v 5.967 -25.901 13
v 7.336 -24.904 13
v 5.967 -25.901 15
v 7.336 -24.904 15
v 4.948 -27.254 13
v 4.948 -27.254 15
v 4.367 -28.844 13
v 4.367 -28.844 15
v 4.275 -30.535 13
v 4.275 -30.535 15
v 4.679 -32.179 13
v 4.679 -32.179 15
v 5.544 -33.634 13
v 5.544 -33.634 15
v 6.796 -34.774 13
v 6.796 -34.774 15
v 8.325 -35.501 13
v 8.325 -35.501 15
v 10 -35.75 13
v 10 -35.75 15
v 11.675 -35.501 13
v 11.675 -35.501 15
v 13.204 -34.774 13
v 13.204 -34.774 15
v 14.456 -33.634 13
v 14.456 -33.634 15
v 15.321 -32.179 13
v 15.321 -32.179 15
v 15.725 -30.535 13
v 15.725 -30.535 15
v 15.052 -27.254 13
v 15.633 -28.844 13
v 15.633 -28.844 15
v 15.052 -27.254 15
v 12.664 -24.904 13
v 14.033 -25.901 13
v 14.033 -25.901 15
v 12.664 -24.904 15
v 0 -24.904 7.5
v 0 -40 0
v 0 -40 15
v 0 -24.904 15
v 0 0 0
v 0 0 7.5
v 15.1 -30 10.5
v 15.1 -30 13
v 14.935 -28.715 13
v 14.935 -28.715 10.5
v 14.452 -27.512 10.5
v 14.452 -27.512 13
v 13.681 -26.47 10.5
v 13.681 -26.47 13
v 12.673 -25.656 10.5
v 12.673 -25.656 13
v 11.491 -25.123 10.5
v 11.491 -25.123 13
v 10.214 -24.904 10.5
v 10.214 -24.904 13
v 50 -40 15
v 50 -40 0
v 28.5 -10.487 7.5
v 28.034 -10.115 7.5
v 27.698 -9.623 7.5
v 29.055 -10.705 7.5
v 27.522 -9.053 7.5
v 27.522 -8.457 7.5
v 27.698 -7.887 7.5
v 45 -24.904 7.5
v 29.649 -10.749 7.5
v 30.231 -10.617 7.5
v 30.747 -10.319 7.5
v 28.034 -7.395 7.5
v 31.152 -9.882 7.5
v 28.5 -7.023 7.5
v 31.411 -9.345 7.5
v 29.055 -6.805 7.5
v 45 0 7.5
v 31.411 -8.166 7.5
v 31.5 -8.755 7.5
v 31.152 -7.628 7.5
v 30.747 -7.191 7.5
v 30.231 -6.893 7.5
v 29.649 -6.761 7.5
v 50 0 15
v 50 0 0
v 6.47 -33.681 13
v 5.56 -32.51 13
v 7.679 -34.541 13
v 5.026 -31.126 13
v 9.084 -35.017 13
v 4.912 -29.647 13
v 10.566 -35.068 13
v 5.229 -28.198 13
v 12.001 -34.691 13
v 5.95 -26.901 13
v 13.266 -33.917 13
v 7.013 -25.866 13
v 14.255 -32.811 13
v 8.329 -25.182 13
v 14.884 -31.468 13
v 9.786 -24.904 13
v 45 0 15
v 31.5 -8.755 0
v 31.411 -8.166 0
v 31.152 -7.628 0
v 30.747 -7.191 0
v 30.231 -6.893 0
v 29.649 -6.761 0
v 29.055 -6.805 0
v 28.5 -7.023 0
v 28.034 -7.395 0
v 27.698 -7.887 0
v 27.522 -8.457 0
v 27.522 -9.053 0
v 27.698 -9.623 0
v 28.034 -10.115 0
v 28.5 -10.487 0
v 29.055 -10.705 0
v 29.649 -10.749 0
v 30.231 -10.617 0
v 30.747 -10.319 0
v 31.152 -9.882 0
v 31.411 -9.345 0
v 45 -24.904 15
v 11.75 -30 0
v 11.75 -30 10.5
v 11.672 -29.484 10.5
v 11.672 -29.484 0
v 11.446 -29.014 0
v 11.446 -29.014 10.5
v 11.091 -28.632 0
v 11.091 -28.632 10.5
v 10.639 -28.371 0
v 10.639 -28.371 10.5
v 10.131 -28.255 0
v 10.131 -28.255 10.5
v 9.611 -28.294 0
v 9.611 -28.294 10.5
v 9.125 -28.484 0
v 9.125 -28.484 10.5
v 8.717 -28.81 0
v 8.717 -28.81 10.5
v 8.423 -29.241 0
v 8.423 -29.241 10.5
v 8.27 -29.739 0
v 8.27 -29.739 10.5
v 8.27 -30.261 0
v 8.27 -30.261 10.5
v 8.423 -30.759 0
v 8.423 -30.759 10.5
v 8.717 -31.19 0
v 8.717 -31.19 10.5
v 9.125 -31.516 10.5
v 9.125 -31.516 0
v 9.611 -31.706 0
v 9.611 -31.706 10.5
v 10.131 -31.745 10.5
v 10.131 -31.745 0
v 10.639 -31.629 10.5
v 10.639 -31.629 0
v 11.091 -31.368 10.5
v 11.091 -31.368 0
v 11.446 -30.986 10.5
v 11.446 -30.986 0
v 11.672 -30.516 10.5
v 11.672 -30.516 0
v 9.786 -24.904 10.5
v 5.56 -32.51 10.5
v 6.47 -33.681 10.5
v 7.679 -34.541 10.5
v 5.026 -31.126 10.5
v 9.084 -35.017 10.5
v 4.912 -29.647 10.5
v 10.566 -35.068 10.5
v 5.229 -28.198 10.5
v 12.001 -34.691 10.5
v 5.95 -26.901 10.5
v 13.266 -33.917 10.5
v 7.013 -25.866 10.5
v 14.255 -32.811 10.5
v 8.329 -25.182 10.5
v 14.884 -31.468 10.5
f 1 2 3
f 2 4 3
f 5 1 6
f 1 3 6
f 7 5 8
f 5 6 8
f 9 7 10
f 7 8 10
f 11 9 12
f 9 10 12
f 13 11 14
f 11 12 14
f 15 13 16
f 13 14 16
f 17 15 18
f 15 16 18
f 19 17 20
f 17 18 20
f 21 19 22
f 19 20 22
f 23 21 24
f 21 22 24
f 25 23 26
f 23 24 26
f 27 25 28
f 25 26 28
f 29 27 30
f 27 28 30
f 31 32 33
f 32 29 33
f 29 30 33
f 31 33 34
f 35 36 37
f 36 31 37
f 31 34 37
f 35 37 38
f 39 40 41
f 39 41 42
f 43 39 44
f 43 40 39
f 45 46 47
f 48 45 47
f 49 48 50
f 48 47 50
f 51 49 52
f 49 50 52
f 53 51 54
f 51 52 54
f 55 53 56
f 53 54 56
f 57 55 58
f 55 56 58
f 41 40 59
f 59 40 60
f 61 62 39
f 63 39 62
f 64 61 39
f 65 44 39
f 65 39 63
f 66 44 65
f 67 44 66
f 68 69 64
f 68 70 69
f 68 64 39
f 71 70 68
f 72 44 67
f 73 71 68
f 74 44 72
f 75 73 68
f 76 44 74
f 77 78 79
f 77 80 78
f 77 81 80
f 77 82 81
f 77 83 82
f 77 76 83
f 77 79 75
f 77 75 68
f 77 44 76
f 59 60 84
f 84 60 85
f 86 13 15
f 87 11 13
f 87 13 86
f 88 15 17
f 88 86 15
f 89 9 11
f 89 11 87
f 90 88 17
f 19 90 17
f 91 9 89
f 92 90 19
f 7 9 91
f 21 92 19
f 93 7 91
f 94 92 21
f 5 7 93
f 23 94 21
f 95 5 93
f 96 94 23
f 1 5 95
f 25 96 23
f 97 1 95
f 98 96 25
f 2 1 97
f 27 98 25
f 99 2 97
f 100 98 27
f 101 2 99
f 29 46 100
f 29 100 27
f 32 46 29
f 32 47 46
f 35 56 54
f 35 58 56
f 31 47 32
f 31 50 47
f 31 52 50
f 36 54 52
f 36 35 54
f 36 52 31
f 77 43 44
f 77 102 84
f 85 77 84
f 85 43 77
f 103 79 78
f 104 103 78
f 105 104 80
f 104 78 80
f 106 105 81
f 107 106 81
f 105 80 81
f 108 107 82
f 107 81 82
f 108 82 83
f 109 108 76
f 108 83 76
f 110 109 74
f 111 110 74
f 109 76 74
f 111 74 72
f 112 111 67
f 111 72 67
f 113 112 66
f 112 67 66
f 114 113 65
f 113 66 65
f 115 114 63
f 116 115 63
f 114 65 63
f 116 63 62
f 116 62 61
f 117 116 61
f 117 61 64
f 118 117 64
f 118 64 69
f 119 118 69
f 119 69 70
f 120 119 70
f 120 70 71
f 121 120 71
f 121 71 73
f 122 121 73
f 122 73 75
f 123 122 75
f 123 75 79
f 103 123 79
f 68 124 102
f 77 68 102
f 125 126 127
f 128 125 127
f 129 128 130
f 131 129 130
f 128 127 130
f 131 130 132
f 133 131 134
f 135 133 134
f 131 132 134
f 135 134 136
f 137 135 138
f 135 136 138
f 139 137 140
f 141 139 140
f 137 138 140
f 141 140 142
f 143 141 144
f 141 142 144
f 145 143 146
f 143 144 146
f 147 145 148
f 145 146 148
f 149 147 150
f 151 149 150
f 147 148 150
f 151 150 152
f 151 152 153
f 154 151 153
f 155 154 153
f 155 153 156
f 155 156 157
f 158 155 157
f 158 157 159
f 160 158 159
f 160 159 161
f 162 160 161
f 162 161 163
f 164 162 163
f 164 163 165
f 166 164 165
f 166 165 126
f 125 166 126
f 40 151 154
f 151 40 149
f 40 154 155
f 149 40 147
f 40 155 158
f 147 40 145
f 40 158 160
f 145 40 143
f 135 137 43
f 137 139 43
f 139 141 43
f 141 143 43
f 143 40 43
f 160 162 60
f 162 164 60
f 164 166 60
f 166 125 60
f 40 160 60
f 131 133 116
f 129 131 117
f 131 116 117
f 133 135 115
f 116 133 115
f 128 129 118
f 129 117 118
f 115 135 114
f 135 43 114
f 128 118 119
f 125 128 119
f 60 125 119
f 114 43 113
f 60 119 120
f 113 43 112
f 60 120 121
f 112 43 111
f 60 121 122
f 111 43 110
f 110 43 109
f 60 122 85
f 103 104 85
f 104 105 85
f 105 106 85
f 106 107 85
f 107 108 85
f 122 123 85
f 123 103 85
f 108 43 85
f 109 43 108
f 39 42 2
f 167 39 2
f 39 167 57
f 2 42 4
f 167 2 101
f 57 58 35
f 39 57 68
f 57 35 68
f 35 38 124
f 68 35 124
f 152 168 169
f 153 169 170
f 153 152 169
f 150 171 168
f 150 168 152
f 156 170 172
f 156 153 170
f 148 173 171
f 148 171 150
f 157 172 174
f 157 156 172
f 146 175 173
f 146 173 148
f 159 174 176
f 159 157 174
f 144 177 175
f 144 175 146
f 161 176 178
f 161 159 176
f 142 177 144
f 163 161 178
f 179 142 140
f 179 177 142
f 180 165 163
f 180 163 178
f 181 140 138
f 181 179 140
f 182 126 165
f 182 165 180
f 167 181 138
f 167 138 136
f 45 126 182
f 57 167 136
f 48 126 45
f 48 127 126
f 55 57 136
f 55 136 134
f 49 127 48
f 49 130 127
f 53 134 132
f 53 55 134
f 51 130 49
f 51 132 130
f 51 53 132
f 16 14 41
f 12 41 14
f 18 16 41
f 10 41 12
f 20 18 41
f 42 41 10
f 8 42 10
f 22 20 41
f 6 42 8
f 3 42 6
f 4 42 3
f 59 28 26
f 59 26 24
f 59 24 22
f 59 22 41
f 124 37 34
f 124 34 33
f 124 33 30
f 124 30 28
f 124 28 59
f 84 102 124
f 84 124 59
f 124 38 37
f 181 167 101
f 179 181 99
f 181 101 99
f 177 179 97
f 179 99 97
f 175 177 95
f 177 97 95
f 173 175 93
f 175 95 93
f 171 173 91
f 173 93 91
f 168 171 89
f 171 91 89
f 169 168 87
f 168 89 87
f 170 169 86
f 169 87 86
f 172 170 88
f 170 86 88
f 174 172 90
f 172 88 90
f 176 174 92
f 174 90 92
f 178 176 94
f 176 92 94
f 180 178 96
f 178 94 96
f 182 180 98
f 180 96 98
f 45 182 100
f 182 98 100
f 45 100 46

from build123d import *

# Parameters (mm, degrees)
F0_W      = 50
F0_H      = 40
F1_DEPTH  = 15
F2_R      = 5.75
F3_DEPTH  = 2
F4_R      = 2
F5_DEPTH  = 15.001
F6_W      = 45
F6_H      = 24.904493
F7_DEPTH  = 7.5
F8_R      = 5.1
F9_DEPTH  = 2.5
F10_R     = 1.75
F11_DEPTH = 15.001


with BuildPart() as f1:
    # F0 (on Top) → F1 (new body)
    with BuildSketch(Plane.XY):
        with Locations((25, -20)):
            Rectangle(F0_W, F0_H)
    extrude(amount=F1_DEPTH)

    # F2 (on face) → F3 (cut)
    with BuildSketch(Plane.XY.offset(15)):
        with Locations((10, -30)):
            Circle(F2_R)
    extrude(amount=-F3_DEPTH, mode=Mode.SUBTRACT)

    # F4 (on face) → F5 (cut, through all)
    with BuildSketch(Plane.XY.offset(15)):
        with Locations((29.5, -8.755066)):
            Circle(F4_R)
    extrude(amount=-F5_DEPTH, mode=Mode.SUBTRACT)

    # F6 (on face) → F7 (cut)
    with BuildSketch(Plane.XY.offset(15)):
        with Locations((22.5, -12.452246)):
            Rectangle(F6_W, F6_H)
    extrude(amount=-F7_DEPTH, mode=Mode.SUBTRACT)

    # F8 (on face) → F9 (cut)
    with BuildSketch(Plane.XY.offset(13)):
        with Locations((10, -30)):
            Circle(F8_R)
    extrude(amount=-F9_DEPTH, mode=Mode.SUBTRACT)

    # F10 (on face) → F11 (cut, through all)
    with BuildSketch(Plane.XY.offset(15)):
        with Locations((10, -30)):
            Circle(F10_R)
    extrude(amount=-F11_DEPTH, mode=Mode.SUBTRACT)


solid = f1.part
